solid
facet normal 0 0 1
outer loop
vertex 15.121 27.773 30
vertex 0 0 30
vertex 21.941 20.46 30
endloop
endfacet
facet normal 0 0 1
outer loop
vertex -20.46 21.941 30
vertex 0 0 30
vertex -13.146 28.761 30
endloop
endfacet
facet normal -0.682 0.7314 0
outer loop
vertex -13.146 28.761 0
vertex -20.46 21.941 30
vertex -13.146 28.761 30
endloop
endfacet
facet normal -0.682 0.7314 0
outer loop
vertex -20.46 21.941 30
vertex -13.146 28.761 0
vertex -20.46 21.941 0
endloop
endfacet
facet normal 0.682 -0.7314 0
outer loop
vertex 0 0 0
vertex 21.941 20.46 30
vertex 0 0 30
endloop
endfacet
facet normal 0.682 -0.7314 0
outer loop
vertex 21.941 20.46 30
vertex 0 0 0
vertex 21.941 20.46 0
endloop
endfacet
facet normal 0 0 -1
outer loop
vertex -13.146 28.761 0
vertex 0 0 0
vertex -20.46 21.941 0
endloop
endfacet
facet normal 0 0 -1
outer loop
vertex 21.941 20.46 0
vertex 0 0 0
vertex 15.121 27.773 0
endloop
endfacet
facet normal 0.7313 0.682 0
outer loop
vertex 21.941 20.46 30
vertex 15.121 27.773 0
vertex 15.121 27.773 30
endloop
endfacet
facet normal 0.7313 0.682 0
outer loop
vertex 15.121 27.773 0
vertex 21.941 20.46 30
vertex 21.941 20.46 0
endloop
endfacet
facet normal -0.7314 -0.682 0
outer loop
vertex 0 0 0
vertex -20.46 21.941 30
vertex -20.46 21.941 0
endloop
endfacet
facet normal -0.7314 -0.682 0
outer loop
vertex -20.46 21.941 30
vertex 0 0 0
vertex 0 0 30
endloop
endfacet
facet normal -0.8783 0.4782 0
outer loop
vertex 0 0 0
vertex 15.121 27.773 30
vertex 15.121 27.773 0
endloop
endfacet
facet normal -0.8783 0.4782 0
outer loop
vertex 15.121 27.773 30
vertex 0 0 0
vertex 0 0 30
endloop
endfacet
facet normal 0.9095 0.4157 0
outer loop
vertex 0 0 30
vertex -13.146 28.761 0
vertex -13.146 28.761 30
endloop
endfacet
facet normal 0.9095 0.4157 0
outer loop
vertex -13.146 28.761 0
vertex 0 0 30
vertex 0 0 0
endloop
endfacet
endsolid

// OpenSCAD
rotate([0,0,-2])
rotate([0,-90,0]){
    difference(){
        rotate([-45,0,0]) {
            cube([30, 30, 30]);
        }
        scale([1,2,1]) {
            rotate([-45,0,0]) {
                cube([30, 30, 30]);
            }
        }
    }
}
